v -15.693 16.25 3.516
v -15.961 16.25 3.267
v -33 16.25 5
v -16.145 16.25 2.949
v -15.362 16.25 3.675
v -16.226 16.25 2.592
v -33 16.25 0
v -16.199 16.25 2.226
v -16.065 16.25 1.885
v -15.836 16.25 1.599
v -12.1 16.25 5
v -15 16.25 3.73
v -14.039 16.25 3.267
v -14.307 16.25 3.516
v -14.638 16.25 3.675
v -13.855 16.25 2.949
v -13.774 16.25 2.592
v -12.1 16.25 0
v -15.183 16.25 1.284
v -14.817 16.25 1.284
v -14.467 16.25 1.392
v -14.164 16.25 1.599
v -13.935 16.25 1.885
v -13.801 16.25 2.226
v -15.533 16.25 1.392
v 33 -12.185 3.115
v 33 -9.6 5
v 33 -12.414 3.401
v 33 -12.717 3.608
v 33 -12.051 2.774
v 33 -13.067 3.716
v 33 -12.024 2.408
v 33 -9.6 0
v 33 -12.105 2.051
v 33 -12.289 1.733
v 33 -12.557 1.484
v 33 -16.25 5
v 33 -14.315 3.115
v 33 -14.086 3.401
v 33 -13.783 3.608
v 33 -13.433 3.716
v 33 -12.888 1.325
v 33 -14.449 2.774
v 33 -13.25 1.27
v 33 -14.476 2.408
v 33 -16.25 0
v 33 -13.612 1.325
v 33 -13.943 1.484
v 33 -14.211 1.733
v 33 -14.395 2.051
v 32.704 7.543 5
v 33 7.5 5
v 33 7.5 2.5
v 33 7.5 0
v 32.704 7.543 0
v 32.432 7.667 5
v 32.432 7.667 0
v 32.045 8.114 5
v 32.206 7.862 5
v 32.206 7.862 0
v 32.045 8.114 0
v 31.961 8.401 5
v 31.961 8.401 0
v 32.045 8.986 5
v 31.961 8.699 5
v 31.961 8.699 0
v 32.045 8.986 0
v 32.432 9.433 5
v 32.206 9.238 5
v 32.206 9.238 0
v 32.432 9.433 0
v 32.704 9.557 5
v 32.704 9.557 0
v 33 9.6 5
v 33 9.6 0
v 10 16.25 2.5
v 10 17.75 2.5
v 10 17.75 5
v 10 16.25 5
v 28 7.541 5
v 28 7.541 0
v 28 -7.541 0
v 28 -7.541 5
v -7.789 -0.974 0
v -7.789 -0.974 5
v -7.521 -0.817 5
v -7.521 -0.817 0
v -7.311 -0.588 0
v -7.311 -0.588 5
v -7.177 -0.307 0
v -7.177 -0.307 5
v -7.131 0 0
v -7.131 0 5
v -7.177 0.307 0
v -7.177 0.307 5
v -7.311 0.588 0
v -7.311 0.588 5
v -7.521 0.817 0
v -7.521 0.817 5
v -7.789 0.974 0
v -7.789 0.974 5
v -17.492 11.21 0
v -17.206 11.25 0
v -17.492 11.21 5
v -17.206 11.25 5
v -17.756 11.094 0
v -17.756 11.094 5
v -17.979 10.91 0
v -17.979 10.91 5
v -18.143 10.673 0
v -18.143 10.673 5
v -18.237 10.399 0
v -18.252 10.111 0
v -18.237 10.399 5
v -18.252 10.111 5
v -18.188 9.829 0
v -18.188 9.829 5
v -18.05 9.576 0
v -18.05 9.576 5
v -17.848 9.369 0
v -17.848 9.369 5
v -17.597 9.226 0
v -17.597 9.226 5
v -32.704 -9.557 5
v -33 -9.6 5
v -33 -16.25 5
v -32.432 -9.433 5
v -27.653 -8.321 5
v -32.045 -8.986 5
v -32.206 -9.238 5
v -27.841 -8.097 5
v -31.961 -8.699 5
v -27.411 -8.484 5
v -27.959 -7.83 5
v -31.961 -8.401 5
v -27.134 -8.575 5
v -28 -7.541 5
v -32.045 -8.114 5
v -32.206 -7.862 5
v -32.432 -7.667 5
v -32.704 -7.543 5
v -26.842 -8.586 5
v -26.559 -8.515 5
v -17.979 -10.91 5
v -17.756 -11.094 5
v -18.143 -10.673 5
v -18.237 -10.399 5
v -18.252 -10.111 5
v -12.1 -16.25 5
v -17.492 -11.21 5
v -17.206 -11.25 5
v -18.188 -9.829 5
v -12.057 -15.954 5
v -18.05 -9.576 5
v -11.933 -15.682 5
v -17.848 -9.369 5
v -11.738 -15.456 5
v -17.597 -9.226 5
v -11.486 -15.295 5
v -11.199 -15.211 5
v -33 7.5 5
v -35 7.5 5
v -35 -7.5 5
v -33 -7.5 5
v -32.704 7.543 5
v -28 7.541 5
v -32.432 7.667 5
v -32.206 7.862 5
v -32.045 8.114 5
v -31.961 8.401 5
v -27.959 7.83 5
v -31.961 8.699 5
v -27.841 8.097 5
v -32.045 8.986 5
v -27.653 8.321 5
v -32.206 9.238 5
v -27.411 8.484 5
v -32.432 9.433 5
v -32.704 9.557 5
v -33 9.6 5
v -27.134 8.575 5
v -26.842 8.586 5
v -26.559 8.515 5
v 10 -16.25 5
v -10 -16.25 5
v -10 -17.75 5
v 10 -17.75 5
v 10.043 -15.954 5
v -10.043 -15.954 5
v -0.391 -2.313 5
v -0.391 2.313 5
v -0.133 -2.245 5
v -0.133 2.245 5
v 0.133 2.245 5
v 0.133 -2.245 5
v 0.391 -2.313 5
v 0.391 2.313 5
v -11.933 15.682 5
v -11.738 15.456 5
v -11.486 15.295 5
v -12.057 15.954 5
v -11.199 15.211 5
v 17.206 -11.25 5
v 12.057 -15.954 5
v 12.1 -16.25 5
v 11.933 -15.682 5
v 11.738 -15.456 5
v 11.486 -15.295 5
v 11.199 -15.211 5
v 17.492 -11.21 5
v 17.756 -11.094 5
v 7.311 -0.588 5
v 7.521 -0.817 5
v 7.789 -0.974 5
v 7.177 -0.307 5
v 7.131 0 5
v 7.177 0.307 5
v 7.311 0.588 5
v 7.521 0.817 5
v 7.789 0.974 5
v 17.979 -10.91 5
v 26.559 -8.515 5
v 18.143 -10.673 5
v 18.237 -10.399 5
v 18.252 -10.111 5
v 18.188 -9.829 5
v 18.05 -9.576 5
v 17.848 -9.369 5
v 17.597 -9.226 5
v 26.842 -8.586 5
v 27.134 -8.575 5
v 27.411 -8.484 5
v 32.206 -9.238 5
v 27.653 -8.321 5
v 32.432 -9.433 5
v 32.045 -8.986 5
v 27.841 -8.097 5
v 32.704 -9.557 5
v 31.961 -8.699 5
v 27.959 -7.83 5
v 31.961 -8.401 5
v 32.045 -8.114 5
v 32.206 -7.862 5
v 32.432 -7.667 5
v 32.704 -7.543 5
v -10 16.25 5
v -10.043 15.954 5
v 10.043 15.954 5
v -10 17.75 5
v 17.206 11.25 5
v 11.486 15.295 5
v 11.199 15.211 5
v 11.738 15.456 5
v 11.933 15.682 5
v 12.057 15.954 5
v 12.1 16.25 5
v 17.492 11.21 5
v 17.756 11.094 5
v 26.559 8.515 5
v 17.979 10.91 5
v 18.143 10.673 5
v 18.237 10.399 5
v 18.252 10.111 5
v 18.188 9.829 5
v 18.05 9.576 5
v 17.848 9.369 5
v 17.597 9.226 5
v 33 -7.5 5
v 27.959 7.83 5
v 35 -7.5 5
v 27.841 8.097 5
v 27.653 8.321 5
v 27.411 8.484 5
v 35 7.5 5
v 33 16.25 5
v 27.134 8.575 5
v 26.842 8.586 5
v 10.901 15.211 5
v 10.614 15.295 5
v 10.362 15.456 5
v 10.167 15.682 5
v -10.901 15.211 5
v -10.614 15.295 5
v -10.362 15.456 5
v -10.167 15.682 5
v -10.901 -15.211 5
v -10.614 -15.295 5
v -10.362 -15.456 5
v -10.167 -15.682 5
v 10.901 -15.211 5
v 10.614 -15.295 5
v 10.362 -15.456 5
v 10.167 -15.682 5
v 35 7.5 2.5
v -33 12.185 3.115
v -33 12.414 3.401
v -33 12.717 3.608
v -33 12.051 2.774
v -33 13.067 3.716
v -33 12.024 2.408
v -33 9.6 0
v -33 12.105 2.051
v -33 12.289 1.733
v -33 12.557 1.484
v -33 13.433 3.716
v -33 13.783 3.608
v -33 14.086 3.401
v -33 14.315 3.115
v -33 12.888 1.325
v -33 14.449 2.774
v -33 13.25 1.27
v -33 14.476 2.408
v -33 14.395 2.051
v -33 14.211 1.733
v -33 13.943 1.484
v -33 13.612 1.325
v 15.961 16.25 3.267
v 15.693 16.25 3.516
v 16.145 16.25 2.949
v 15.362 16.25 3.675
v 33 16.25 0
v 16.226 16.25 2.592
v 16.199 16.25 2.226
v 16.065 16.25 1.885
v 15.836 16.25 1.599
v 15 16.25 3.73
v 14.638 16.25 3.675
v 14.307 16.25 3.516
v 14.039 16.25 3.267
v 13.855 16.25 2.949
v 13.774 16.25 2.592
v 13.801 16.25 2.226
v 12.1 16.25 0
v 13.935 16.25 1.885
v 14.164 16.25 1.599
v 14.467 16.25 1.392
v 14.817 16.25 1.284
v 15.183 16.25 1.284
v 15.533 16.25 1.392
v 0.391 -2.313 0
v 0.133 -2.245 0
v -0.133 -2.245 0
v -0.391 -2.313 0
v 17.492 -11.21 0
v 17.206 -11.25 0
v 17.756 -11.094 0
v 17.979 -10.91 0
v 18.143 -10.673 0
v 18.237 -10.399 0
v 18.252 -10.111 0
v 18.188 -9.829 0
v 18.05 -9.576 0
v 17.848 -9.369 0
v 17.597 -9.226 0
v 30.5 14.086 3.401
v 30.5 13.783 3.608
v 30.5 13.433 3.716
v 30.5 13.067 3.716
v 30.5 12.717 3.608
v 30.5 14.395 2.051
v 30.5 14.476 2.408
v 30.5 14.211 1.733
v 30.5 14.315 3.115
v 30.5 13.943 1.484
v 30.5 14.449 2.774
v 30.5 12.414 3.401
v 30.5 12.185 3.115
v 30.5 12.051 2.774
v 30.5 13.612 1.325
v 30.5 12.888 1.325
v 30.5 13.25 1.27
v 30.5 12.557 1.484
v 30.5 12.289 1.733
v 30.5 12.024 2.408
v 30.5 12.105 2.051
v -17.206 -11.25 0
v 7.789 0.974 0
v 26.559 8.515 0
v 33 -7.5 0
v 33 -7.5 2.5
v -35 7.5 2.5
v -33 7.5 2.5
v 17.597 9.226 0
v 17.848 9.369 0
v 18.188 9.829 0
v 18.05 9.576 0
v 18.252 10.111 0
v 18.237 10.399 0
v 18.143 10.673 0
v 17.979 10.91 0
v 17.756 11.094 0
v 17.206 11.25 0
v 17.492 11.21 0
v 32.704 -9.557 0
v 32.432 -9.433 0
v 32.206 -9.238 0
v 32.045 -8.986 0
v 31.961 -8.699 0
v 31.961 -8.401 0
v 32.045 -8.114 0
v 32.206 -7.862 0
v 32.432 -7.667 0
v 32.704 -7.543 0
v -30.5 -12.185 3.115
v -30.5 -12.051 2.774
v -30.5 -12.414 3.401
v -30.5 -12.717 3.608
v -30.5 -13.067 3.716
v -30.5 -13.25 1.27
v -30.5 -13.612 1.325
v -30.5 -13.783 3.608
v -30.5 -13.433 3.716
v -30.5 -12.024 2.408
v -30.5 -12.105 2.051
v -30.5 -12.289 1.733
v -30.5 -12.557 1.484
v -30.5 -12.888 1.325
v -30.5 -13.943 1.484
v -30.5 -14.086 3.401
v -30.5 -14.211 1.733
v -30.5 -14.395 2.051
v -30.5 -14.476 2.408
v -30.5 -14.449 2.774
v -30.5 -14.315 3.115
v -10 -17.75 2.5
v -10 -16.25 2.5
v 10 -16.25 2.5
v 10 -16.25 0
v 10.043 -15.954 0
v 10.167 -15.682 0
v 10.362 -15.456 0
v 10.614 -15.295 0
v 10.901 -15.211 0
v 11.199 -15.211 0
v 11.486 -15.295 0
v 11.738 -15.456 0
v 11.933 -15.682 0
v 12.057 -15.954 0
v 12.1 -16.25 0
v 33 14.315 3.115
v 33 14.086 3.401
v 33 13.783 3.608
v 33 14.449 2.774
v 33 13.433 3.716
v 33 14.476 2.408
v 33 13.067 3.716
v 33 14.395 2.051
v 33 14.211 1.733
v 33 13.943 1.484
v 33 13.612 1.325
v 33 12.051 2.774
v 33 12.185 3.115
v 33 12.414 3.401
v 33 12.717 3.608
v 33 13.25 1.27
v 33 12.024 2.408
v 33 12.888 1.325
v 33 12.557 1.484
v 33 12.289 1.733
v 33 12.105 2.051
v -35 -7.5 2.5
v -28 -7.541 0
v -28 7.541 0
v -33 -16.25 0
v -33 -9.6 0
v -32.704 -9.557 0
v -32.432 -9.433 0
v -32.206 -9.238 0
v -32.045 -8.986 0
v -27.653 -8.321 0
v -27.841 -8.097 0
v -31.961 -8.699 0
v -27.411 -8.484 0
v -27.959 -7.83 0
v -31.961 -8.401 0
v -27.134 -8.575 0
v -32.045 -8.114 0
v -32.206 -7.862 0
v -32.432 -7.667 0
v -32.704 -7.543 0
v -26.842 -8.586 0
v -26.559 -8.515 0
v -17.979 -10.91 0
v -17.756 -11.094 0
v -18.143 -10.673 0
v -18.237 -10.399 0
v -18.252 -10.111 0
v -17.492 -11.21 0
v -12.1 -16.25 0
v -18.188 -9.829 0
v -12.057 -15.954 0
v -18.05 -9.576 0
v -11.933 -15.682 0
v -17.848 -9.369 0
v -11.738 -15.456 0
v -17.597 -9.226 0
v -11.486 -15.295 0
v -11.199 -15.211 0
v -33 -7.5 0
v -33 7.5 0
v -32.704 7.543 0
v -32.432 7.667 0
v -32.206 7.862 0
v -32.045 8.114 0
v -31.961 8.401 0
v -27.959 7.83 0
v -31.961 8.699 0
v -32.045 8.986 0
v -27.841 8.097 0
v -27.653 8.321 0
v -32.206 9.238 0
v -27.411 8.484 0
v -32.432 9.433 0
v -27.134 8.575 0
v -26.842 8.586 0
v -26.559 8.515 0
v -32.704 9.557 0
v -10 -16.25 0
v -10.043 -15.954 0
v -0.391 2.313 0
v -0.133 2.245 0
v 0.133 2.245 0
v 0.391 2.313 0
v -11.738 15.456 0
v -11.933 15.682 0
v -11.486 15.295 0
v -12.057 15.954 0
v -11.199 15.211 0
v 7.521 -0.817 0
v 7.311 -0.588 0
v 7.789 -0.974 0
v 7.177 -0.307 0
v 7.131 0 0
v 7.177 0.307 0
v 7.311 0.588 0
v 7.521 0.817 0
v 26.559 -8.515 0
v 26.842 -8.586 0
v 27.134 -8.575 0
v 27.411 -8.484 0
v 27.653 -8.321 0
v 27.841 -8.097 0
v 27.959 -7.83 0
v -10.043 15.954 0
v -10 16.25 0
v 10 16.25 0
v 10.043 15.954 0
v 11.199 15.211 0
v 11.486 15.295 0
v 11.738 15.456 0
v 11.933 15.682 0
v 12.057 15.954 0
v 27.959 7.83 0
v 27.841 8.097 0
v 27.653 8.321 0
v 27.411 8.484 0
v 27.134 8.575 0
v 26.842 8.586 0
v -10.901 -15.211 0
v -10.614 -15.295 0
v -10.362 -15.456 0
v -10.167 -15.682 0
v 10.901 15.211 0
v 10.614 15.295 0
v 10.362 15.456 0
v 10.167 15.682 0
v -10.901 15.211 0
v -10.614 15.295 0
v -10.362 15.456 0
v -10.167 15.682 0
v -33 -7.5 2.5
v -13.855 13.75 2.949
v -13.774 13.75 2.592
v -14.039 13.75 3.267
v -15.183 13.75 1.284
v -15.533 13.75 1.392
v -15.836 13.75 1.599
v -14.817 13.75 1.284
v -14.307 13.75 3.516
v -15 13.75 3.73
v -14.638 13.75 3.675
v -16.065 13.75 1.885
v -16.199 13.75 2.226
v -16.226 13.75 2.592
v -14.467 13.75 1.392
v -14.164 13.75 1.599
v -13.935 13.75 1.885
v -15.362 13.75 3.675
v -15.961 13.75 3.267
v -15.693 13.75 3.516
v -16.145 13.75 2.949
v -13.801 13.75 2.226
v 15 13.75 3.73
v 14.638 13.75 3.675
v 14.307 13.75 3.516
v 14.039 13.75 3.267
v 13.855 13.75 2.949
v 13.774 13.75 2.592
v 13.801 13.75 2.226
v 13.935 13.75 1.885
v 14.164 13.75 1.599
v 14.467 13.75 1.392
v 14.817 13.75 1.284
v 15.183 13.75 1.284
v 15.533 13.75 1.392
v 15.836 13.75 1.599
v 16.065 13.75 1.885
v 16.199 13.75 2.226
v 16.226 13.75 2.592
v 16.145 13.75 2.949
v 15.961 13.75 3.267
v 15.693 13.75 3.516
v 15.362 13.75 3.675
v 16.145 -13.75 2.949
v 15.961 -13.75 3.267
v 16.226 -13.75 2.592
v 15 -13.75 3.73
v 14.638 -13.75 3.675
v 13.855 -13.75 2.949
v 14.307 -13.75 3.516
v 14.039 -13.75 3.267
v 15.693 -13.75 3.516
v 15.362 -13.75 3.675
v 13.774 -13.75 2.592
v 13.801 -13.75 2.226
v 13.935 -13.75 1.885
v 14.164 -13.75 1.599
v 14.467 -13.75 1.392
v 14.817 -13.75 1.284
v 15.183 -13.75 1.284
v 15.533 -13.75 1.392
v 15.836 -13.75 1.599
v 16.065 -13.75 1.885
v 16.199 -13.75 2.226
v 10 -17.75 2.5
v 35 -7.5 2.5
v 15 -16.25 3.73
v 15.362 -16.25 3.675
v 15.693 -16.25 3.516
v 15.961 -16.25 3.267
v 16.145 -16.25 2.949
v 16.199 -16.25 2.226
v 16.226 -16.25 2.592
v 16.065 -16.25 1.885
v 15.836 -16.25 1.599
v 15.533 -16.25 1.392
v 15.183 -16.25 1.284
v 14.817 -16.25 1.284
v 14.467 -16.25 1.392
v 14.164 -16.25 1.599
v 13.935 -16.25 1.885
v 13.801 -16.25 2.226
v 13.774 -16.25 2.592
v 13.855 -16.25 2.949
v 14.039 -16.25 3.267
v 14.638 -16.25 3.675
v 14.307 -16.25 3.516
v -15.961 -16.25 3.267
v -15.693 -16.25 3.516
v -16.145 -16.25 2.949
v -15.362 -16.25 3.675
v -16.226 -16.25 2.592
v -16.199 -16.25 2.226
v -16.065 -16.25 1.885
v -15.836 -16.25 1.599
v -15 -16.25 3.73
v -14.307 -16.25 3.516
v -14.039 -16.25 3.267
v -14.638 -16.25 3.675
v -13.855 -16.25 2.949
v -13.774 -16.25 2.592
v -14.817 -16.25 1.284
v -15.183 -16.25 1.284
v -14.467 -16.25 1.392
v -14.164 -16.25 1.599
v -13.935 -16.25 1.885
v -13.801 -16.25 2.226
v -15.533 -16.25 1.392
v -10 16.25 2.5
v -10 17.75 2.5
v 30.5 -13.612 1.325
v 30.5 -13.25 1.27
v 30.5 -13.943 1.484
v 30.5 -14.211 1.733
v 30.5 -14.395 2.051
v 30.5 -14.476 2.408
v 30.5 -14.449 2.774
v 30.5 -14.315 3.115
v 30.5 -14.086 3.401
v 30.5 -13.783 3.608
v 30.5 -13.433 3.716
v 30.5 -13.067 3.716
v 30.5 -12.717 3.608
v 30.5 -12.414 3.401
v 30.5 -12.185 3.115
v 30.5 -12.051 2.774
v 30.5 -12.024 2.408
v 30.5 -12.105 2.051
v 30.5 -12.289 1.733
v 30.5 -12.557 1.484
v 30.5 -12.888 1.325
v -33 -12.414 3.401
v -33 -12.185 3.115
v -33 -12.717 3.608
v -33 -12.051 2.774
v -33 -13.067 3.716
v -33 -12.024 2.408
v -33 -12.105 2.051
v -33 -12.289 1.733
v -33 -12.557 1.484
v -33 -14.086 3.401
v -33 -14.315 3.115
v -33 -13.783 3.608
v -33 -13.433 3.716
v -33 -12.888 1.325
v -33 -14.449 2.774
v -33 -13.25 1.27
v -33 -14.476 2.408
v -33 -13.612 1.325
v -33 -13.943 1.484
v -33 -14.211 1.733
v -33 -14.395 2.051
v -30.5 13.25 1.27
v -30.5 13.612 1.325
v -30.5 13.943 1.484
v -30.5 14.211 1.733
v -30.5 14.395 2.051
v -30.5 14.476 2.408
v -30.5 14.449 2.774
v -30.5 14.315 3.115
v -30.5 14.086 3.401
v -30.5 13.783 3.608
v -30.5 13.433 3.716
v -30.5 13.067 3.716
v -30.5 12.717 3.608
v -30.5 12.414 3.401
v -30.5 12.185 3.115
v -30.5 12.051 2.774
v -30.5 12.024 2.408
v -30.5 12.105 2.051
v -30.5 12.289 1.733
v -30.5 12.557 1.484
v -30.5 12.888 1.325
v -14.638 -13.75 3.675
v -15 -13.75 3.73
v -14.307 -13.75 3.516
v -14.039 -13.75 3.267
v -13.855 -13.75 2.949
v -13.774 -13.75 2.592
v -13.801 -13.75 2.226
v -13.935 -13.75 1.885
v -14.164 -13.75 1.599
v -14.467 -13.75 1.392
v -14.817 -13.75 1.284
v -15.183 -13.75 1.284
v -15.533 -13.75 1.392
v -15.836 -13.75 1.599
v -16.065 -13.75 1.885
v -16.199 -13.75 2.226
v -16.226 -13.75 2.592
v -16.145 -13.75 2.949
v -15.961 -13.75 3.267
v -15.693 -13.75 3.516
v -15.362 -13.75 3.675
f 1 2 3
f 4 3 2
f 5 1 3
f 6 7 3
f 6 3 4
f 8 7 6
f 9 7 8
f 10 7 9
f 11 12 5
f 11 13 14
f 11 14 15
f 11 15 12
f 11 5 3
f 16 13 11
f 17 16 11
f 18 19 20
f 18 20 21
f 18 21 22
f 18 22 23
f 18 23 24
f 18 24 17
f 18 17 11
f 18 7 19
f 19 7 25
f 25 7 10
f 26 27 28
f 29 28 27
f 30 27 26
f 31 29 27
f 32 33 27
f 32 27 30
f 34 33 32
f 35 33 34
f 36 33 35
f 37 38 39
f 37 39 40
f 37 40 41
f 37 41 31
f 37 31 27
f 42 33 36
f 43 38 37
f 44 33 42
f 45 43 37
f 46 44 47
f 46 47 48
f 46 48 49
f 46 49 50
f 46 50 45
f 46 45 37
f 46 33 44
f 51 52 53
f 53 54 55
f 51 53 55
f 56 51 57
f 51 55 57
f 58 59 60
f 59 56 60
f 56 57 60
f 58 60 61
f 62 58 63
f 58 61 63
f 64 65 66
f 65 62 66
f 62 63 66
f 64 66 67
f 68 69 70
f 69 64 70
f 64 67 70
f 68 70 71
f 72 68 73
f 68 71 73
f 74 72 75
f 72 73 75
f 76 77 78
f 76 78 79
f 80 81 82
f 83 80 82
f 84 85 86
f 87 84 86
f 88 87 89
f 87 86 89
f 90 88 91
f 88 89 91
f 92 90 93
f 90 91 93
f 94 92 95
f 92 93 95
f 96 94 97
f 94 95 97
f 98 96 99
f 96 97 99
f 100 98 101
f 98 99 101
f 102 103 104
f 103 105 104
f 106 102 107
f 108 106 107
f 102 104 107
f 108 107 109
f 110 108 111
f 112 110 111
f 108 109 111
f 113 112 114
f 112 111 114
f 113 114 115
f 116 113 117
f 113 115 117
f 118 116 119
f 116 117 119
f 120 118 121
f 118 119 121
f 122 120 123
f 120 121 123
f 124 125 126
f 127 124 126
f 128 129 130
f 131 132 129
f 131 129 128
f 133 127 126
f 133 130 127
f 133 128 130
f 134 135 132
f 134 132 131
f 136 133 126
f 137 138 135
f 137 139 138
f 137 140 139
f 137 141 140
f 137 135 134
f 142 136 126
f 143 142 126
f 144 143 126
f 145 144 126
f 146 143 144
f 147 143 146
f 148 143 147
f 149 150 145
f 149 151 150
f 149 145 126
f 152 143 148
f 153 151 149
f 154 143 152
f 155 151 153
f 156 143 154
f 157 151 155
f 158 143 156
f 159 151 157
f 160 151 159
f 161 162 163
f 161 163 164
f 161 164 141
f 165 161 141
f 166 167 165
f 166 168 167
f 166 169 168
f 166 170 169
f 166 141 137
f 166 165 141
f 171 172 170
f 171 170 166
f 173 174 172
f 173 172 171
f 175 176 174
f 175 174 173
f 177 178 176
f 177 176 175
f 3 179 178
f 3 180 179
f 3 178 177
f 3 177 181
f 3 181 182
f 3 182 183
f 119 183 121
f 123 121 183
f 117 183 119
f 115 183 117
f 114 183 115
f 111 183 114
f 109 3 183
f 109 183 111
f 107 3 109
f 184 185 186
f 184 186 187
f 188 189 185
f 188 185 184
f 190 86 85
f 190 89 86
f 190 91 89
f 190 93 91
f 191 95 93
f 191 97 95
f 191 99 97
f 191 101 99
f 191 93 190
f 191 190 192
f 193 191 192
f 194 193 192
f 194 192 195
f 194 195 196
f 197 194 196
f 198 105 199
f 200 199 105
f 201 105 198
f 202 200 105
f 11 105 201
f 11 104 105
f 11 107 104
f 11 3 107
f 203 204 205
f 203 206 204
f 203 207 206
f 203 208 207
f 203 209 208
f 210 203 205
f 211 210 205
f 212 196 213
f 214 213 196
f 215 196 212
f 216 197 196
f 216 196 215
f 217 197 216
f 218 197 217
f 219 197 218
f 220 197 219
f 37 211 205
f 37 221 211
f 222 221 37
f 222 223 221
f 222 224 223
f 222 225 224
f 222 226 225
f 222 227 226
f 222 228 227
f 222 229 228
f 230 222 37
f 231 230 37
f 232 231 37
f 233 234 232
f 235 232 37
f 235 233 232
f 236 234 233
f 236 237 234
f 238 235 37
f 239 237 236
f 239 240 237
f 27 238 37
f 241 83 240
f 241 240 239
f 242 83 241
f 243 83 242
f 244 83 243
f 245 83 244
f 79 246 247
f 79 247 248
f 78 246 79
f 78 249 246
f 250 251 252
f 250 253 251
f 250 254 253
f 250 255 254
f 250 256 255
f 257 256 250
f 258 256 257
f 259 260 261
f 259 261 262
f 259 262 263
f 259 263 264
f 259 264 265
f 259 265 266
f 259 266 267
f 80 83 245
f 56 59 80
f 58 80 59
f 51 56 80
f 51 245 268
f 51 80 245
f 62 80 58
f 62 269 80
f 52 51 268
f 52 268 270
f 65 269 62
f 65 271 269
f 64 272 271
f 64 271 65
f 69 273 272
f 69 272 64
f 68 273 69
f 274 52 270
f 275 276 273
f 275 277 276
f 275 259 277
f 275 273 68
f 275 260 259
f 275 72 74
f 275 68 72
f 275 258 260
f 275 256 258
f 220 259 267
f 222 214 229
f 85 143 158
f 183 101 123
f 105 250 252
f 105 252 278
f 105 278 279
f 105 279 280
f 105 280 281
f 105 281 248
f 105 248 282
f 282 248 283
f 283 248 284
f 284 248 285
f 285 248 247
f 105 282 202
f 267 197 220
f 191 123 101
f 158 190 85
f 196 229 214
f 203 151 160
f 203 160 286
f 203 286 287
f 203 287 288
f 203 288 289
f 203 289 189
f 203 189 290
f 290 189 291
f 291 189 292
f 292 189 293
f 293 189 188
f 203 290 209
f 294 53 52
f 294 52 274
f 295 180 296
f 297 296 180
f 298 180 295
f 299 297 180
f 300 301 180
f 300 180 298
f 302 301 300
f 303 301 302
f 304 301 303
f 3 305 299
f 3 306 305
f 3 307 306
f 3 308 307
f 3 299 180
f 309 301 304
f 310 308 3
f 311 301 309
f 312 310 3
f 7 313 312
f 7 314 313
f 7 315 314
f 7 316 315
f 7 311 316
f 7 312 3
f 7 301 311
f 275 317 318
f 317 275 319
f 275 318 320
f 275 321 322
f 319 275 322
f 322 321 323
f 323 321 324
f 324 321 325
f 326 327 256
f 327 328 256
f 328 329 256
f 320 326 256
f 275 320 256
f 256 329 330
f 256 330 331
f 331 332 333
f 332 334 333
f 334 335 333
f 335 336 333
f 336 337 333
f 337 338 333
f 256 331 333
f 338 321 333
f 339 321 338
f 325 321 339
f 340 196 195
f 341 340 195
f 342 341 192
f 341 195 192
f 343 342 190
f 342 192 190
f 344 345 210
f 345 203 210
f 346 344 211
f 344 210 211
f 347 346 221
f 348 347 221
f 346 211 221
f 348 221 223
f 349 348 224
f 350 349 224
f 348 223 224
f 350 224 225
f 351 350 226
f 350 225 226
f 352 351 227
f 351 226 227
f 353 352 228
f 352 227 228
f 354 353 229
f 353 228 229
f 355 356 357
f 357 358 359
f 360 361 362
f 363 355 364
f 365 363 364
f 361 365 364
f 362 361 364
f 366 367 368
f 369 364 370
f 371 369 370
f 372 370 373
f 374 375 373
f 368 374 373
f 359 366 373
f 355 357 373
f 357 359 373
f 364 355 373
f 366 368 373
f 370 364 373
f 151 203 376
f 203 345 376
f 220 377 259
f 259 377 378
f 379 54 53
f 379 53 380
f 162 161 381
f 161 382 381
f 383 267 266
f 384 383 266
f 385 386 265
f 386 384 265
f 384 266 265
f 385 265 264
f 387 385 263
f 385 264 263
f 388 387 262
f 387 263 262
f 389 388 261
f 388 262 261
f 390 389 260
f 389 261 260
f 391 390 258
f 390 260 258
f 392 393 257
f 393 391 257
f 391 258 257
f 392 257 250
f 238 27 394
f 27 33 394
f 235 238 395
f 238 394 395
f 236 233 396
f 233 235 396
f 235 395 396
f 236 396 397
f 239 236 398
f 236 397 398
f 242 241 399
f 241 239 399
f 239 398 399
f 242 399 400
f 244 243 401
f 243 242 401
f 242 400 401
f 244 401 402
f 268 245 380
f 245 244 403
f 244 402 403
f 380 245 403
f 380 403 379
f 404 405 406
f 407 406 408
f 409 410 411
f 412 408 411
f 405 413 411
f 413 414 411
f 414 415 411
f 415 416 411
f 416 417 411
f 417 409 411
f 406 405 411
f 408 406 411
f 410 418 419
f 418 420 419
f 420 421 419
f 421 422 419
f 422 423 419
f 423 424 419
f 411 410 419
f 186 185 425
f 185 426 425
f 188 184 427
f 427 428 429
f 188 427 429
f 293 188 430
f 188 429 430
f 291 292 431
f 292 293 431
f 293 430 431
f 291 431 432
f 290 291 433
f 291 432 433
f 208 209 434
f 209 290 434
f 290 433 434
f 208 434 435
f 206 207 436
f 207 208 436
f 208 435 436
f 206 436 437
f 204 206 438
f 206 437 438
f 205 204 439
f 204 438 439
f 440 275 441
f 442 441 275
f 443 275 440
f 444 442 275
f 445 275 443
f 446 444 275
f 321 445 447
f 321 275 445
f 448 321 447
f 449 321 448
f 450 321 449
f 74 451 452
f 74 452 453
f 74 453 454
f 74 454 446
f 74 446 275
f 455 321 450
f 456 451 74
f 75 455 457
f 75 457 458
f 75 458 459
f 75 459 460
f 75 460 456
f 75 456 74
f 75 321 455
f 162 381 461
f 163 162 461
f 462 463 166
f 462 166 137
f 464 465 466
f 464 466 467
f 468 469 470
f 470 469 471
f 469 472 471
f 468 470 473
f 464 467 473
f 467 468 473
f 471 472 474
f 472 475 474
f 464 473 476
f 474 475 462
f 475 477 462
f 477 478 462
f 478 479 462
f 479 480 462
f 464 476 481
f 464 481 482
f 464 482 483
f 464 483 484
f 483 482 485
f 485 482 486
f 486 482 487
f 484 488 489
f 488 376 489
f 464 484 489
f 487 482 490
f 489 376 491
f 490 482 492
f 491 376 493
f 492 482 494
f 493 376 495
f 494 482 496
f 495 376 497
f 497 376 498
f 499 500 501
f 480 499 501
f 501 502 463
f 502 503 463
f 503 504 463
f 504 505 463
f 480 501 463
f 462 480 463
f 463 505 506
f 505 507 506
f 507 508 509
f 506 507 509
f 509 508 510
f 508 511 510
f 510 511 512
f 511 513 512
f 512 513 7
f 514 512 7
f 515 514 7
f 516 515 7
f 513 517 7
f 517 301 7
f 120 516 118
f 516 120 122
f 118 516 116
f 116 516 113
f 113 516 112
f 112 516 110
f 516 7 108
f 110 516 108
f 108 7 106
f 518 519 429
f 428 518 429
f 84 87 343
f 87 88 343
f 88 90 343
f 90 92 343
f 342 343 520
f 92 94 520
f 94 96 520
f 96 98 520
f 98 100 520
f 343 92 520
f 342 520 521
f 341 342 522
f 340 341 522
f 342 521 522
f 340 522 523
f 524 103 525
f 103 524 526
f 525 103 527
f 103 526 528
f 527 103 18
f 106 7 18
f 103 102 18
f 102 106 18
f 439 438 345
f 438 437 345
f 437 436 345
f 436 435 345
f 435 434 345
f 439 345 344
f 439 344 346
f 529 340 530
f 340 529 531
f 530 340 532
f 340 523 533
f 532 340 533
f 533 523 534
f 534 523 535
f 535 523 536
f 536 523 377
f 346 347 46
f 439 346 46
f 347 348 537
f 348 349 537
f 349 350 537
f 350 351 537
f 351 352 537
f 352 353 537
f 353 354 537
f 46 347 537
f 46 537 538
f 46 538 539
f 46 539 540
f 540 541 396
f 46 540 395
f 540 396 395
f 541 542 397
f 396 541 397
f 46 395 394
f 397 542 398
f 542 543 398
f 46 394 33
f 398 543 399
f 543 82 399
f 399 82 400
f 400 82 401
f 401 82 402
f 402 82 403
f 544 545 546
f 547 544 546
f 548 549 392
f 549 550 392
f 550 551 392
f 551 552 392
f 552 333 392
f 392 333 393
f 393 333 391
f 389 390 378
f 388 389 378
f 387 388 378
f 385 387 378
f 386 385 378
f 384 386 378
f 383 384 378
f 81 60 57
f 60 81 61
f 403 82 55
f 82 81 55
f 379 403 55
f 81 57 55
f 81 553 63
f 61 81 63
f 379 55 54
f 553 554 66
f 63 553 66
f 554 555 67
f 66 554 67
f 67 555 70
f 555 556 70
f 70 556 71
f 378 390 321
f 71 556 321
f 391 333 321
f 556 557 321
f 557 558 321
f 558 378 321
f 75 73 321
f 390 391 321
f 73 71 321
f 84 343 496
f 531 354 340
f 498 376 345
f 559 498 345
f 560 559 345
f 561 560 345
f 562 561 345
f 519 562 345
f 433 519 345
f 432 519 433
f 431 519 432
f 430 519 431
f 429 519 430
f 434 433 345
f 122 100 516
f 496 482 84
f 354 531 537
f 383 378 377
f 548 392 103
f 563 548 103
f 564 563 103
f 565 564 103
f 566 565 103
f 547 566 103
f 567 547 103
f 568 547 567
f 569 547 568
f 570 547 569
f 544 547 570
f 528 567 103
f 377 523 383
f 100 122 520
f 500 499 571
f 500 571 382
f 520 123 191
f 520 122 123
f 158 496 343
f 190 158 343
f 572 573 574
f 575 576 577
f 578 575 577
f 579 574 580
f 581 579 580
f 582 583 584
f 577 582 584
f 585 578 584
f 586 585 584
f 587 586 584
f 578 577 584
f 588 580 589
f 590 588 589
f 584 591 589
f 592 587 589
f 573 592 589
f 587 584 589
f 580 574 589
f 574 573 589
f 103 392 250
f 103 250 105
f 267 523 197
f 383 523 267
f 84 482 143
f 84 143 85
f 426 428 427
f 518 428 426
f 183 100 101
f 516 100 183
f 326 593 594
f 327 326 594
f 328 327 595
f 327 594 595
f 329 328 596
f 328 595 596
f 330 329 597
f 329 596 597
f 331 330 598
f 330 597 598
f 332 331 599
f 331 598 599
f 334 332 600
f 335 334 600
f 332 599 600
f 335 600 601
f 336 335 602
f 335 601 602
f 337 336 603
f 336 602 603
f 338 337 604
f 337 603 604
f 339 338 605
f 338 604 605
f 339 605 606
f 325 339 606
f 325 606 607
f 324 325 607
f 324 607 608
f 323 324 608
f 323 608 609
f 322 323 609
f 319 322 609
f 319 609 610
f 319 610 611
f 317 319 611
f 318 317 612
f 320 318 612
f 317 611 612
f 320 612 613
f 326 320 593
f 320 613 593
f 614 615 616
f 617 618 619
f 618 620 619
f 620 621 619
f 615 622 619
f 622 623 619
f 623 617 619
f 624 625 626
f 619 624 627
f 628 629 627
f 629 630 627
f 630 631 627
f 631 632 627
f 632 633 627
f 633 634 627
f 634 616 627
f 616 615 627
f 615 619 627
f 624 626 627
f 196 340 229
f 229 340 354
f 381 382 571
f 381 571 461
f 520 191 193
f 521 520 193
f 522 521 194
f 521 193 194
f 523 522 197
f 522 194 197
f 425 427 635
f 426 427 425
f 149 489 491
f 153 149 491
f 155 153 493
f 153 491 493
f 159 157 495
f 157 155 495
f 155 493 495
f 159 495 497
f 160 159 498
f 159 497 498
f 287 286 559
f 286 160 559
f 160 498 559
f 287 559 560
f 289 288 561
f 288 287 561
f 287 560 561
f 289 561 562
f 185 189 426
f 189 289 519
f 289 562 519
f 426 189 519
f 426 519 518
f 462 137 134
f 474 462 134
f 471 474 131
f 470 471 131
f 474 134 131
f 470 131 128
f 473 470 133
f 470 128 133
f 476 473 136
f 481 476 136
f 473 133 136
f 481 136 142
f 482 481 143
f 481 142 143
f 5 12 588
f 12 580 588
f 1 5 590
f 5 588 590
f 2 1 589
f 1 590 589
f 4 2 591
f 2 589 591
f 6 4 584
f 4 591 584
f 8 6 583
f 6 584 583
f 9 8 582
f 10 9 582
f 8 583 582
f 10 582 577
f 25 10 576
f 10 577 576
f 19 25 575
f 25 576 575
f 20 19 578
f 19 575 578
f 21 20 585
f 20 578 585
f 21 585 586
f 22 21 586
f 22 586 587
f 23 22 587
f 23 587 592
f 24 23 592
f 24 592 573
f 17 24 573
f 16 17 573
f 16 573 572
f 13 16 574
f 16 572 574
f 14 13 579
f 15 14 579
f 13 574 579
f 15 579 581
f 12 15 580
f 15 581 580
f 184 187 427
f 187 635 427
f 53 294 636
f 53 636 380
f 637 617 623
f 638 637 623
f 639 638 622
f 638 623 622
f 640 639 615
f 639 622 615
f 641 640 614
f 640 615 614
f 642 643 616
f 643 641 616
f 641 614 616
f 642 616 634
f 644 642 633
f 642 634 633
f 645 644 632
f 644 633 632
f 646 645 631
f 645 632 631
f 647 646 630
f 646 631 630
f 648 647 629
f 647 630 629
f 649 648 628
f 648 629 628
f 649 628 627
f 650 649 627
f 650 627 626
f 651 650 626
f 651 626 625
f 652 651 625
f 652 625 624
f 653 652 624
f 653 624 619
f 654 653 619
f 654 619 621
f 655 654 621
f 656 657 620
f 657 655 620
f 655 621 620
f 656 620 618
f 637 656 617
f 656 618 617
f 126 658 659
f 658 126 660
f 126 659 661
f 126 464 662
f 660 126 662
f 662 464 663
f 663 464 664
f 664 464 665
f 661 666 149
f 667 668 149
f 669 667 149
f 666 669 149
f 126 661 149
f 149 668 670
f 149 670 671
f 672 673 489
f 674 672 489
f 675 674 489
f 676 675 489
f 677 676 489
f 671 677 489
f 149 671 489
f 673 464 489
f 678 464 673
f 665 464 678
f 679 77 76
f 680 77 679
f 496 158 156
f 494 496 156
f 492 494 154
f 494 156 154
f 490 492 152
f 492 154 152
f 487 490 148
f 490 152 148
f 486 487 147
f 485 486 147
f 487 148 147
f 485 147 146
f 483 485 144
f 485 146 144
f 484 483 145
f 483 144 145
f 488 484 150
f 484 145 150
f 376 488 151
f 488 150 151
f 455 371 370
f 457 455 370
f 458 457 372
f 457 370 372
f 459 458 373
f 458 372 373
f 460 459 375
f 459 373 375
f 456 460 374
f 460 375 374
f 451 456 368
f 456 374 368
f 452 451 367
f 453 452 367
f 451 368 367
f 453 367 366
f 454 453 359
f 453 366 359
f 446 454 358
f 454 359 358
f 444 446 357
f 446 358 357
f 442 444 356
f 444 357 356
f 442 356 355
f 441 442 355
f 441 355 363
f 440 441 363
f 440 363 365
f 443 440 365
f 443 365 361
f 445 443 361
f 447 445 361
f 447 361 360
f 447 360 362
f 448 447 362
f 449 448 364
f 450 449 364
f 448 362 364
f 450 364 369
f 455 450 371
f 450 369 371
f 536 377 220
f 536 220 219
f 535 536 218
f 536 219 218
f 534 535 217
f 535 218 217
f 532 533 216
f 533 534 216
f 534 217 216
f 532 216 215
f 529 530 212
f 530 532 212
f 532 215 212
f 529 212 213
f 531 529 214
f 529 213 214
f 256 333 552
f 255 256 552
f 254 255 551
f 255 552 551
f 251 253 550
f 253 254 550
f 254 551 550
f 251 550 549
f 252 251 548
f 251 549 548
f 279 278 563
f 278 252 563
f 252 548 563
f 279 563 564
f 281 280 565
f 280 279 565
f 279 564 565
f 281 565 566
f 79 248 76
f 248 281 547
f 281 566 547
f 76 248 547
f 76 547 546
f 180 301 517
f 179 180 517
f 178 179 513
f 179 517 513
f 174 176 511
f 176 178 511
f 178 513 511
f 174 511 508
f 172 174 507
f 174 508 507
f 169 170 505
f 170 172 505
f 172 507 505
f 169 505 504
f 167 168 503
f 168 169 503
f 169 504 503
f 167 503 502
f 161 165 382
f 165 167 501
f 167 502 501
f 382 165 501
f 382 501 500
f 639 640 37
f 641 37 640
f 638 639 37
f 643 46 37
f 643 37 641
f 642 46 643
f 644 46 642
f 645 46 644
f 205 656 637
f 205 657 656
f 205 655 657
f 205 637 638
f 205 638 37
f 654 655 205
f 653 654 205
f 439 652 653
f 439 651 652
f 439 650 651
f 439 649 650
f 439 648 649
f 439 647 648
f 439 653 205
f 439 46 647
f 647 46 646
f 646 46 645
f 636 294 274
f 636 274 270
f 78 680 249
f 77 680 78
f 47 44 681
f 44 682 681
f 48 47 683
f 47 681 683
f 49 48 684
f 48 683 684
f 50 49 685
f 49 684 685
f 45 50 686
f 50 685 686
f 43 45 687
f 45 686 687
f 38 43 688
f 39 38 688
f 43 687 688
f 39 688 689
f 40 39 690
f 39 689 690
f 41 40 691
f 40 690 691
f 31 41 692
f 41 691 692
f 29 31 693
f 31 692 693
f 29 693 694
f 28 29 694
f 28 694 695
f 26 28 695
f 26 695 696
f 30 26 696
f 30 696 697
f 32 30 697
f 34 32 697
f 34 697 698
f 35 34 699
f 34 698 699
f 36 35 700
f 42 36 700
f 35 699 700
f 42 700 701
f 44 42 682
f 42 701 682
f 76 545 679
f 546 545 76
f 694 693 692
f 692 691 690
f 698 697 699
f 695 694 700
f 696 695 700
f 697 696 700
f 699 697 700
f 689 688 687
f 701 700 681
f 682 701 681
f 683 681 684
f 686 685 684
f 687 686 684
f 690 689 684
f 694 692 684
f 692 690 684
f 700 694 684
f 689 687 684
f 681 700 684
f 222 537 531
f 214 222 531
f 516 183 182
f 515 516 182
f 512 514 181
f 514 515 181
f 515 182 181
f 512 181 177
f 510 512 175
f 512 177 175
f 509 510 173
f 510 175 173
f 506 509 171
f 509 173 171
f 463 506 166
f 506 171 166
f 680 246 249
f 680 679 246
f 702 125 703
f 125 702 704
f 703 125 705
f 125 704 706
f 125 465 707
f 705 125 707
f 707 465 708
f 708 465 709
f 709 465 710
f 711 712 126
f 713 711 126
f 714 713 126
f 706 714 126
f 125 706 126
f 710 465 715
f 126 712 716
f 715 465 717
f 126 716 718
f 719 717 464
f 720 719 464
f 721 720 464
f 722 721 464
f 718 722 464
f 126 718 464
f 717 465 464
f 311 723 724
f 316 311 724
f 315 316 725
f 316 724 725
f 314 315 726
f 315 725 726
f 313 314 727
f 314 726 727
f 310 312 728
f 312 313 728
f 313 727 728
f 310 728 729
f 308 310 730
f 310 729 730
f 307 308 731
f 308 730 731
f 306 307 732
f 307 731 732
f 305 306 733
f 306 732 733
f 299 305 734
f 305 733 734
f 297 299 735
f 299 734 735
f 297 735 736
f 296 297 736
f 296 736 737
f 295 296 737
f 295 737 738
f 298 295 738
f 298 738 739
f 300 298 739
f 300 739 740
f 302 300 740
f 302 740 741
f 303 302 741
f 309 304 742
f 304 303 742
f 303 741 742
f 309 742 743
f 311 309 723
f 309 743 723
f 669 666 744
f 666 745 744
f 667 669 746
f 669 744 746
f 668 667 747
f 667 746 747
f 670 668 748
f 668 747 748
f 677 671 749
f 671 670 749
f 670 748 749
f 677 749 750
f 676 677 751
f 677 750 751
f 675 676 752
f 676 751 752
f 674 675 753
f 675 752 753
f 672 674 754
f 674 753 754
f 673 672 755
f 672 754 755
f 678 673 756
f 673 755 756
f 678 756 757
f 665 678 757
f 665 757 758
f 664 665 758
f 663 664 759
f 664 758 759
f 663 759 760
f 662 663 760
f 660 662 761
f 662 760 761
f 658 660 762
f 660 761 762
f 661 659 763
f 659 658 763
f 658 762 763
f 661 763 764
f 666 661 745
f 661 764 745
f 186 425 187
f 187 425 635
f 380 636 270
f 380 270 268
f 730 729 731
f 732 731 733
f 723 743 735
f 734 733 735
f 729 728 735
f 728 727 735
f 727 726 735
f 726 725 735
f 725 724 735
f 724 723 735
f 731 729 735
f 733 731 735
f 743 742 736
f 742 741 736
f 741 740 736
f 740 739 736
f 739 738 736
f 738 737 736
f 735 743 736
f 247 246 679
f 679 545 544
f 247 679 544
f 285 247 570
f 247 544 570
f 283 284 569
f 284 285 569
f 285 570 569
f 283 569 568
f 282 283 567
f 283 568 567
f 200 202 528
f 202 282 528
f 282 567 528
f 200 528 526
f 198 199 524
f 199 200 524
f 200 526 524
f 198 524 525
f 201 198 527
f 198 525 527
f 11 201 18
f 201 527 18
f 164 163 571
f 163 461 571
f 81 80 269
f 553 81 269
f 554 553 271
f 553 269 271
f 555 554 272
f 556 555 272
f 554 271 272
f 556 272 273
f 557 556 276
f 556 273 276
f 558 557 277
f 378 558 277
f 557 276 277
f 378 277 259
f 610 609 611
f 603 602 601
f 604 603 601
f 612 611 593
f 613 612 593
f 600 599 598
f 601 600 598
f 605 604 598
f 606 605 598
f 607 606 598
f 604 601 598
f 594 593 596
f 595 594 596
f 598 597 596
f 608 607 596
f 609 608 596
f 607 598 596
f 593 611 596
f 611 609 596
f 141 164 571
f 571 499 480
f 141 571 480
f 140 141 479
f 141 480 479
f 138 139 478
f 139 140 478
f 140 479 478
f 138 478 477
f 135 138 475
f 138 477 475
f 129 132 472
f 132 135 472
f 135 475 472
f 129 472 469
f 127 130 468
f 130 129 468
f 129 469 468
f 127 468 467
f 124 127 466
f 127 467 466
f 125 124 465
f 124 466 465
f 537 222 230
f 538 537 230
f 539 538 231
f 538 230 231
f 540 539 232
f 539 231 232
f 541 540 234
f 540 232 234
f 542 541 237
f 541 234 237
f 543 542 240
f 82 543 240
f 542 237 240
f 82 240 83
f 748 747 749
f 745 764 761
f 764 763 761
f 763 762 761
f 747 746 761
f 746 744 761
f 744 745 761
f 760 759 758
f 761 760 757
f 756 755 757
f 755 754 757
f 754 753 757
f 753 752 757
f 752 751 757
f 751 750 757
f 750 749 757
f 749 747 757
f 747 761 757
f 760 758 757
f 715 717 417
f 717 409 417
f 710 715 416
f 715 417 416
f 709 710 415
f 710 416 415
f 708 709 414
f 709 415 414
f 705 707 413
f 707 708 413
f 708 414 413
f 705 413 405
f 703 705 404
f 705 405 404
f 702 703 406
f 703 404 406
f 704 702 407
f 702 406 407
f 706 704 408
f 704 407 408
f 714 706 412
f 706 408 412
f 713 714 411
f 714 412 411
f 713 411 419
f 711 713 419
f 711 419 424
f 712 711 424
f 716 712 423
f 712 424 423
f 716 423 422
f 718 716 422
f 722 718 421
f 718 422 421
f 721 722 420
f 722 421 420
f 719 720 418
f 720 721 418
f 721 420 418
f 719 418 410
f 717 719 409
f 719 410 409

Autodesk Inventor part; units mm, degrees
ref_plane "YZ Plane" through (0, 0, 0) normal (1, 0, 0) x (0, 1, 0)
ref_plane "XZ Plane" through (0, 0, 0) normal (0, 1, 0) x (-1, 0, 0)
ref_plane "XY Plane" through (0, 0, 0) normal (0, 0, 1) x (1, 0, 0)
sketch "スケッチ1" plane through (0, 0, 0) normal (0, 0, 1) x (1, 0, 0)
  line L0 (-33, 9.6) -> (-33, 16.25)
  line L1 (-33, 16.25) -> (-20, 16.25)
  line L2 (20, 16.25) -> (33, 16.25)
  line L3 (33, 16.25) -> (33, 9.6)
  line L4 (0, 0) -> (0, 16.25) construction
  line L5 (0, 0) -> (35, 0) construction
  line L6 (33, 7.5) -> (35, 7.5)
  line L7 (35, 7.5) -> (35, -7.5)
  line L8 (35, -7.5) -> (33, -7.5)
  line L9 (-20, -16.25) -> (20, -16.25) construction
  line L10 (20, -16.25) -> (20, 16.25) construction
  line L11 (20, 16.25) -> (-20, 16.25) construction
  line L12 (-20, 16.25) -> (-20, -16.25) construction
  line L13 (-20, -16.25) -> (20, 16.25) construction
  line L14 (20, -16.25) -> (-20, 16.25) construction
  line L15 (-33, -16.25) -> (33, -16.25) construction
  line L16 (33, -16.25) -> (33, 16.25) construction
  line L17 (33, 16.25) -> (-33, 16.25) construction
  line L18 (-33, 16.25) -> (-33, -16.25) construction
  line L19 (-33, -16.25) -> (33, 16.25) construction
  line L20 (33, -16.25) -> (-33, 16.25) construction
  arc A0 (33, 9.6) -> (33, 7.5) centre (33, 8.55) ccw
  arc A1 (33, -7.5) -> (33, -9.6) centre (33, -8.55) ccw
  line L21 (33, -9.6) -> (33, -16.25)
  line L22 (33, -16.25) -> (20, -16.25)
  line L23 (20, -16.25) -> (12.1, -16.25)
  line L24 (-20, 16.25) -> (-12.1, 16.25)
  line L25 (-10, 16.25) -> (-10, 17.75)
  line L26 (-10, 17.75) -> (10, 17.75)
  line L27 (10, 17.75) -> (10, 16.25)
  line L28 (20, 16.25) -> (12.1, 16.25)
  arc A2 (-12.1, 16.25) -> (-10, 16.25) centre (-11.05, 16.25) ccw
  arc A3 (10, 16.25) -> (12.1, 16.25) centre (11.05, 16.25) ccw
  line L29 (-33, 7.5) -> (-35, 7.5)
  line L30 (-35, 7.5) -> (-35, -7.5)
  line L31 (-35, -7.5) -> (-33, -7.5)
  arc A4 (-33, 7.5) -> (-33, 9.6) centre (-33, 8.55) ccw
  arc A5 (-33, -9.6) -> (-33, -7.5) centre (-33, -8.55) ccw
  line L32 (-33, -9.6) -> (-33, -16.25)
  line L33 (-33, -16.25) -> (-20, -16.25)
  line L34 (-20, -16.25) -> (-12.1, -16.25)
  line L35 (-10, -16.25) -> (-10, -17.75)
  line L36 (-10, -17.75) -> (10, -17.75)
  line L37 (10, -17.75) -> (10, -16.25)
  arc A6 (-10, -16.25) -> (-12.1, -16.25) centre (-11.05, -16.25) ccw
  arc A7 (12.1, -16.25) -> (10, -16.25) centre (11.05, -16.25) ccw
  line L38 (-16.55, 19.1799) -> (-13.45, 19.1799) construction
  line L39 (-13.45, 19.1799) -> (-13.45, 12.4242) construction
  line L40 (-13.45, 12.4242) -> (-16.55, 12.4242) construction
  line L41 (-16.55, 12.4242) -> (-16.55, 19.1799) construction
  line L42 (-15, 19.1799) -> (-15, 12.4242) construction
  point P0 (0, 17.75)
  point P1 (0, 0)
  dimension "d0" = 1.05
  dimension "d1" = 32.5
  dimension "d2" = 66
  dimension "d3" = 40
  dimension "d23" = 2
  dimension "d30" = 1.5
  dimension "d34" = 8.75
  dimension "d53" = 20
  dimension "d54" = 3.1
  dimension "d55" = 5
  dimension "d85" = 32.5
extrude "押し出し1" add sketch "スケッチ1" along normal blind 5
sketch "スケッチ2" plane through (0, 0, 0) normal (0, 0, -1) x (-1, 0, 0)
  line L0 (33, 9.6) -> (33, 16.25) projected
  line L1 (-33, 16.25) -> (-33, 9.6) projected
  line L2 (-41.1427, 17.3125) -> (-33, 17.3125)
  line L3 (-33, 17.3125) -> (-33, -16.751)
  line L4 (-33, -16.751) -> (-41.1427, -16.751)
  line L5 (-41.1427, -16.751) -> (-41.1427, 17.3125)
  line L6 (33, 21.1805) -> (38.858, 21.1805)
  line L7 (38.858, 21.1805) -> (38.858, -13.6193)
  line L8 (38.858, -13.6193) -> (33, -13.6193)
  line L9 (33, -13.6193) -> (33, 21.1805)
  line L10 (-20, -16.25) -> (-12.1, -16.25)
  line L11 (-17.1371, 25.1848) -> (11.8342, 25.1848)
  line L12 (11.8342, 25.1848) -> (11.8342, 16.25)
  line L13 (11.8342, 16.25) -> (-17.1371, 16.25)
  line L14 (-17.1371, 16.25) -> (-17.1371, 25.1848)
  line L15 (-13.151, -21.5857) -> (17.7795, -21.5857)
  line L16 (17.7795, -21.5857) -> (17.7795, -16.25)
  line L17 (17.7795, -16.25) -> (-13.151, -16.25)
  line L18 (-13.151, -16.25) -> (-13.151, -21.5857)
  line L19 (-12.1, 16.25) -> (-33, 16.25)
  line L20 (-33, -16.25) -> (-12.1, -16.25)
  point P0 (0, 0)
extrude "押し出し2" cut sketch "スケッチ2" against normal blind 2.5
sketch "スケッチ3" plane through (12.1, 16.25, 0) normal (0, 1, 0) x (1, 0, 0)
  line L0 (-2.1, 0) -> (-2.1, -5) projected
  line L1 (-2.1, -5) -> (-22.1, -5) construction
  line L2 (-12.1, -5) -> (-12.1, 7.4607) construction
  line L3 (20.9, 0) -> (20.9, -5) projected
  point P0 (-12.1, 0)
  point P1 (2.9, -2.5)
  point P2 (-27.1, -2.5)
  point P3 (20.9, -2.5)
  dimension "d60" = 5
hole "穴1" at (15, 16.25, 2.5) at (-15, 16.25, 2.5) direction (0, -1, 0) diameter 2.459 depth 2.5 thread size "M3x0.5" class "6H" standard "ISO Metric profile"
mirror "ミラー1" about plane through (0, 0, 0) normal (0, 1, 0) of "穴1"
sketch "スケッチ4" plane through (33, -16.25, 5) normal (1, 0, 0) x (0, 0, -1)
  line L0 (5, 16.25) -> (0, 16.25) construction
  line L1 (0, 23.75) -> (0, 8.75) construction
  line L2 (5, 6.65) -> (0, 6.65) projected
  line L3 (5, 0) -> (0, 0) projected
  point P0 (2.5, 3)
  point P1 (2.5, 29.5)
  point P2 (2.5, 6.65)
  dimension "d86" = 3
  dimension "d87" = 26.5
hole "穴2" at (33, -13.25, 2.5) at (33, 13.25, 2.5) direction (-1, 0, 0) diameter 2.459 depth 2.5 thread size "M3x0.5" class "6H" standard "ISO Metric profile"
mirror "ミラー2" about plane through (0, 0, 0) normal (1, 0, 0) of "穴2"
sketch "スケッチ5" plane through (0, 0, 0) normal (0, 0, -1) x (-1, 0, 0)
  line L0 (10, 16.25) -> (-10, 16.25) projected
  line L1 (-33, 7.5) -> (-33, 9.6) projected
  line L2 (-28, -11.25) -> (28, -11.25) construction
  line L3 (28, -11.25) -> (28, 11.25) construction
  line L4 (28, 11.25) -> (-28, 11.25) construction
  line L5 (-28, 11.25) -> (-28, -11.25) construction
  line L6 (-28, -11.25) -> (28, 11.25) construction
  line L7 (28, -11.25) -> (-28, 11.25) construction
  line L8 (-28, 9.0946) -> (-28, -9.0946)
  line L9 (-28, -9.0946) -> (-5.3645, 0)
  line L10 (-5.3645, 0) -> (-28, 9.0946)
  line L11 (-22.6355, 11.25) -> (22.6355, 11.25)
  line L12 (22.6355, 11.25) -> (0, 2.1554)
  line L13 (0, 2.1554) -> (-22.6355, 11.25)
  line L14 (-22.6355, -11.25) -> (22.6355, -11.25)
  line L15 (22.6355, -11.25) -> (0, -2.1554)
  line L16 (0, -2.1554) -> (-22.6355, -11.25)
  line L17 (28, 9.0946) -> (28, -9.0946)
  line L18 (28, -9.0946) -> (5.3645, 0)
  line L19 (5.3645, 0) -> (28, 9.0946)
  point P0 (-12.1, 16.25)
  point P1 (-20, 16.25)
  point P2 (-33, 16.25)
  point P3 (0, 0)
  dimension "d76" = 5
  dimension "d77" = 5
  dimension "d78" = 4
  dimension "d79" = 4
  dimension "d80" = 4
  dimension "d81" = 4
extrude "押し出し3" cut sketch "スケッチ5" against normal blind 10
fillet "フィレット1" radius 1.05 12 edges at (28, 9.0946, 2.5) (28, -9.0946, 2.5) (22.6355, 11.25, 2.5) (5.3645, 0, 2.5) (0, -2.1554, 2.5) (0, 2.1554, 2.5) (-28, -9.0946, 2.5) (22.6355, -11.25, 2.5) (-28, 9.0946, 2.5) (-22.6355, 11.25, 2.5) (-22.6355, -11.25, 2.5) (-5.3645, 0, 2.5)
equation "\"d85\" = d1"
equation "\"d60\" = d55"
equation "\"d77\" = d76"
equation "\"d79\" = d78"
equation "\"d80\" = d79"
equation "\"d81\" = d78"
equation "\"d52\" = 5"
properties part number "胴体_メインフレーム_1_13" material "アセタール樹脂、黒"
